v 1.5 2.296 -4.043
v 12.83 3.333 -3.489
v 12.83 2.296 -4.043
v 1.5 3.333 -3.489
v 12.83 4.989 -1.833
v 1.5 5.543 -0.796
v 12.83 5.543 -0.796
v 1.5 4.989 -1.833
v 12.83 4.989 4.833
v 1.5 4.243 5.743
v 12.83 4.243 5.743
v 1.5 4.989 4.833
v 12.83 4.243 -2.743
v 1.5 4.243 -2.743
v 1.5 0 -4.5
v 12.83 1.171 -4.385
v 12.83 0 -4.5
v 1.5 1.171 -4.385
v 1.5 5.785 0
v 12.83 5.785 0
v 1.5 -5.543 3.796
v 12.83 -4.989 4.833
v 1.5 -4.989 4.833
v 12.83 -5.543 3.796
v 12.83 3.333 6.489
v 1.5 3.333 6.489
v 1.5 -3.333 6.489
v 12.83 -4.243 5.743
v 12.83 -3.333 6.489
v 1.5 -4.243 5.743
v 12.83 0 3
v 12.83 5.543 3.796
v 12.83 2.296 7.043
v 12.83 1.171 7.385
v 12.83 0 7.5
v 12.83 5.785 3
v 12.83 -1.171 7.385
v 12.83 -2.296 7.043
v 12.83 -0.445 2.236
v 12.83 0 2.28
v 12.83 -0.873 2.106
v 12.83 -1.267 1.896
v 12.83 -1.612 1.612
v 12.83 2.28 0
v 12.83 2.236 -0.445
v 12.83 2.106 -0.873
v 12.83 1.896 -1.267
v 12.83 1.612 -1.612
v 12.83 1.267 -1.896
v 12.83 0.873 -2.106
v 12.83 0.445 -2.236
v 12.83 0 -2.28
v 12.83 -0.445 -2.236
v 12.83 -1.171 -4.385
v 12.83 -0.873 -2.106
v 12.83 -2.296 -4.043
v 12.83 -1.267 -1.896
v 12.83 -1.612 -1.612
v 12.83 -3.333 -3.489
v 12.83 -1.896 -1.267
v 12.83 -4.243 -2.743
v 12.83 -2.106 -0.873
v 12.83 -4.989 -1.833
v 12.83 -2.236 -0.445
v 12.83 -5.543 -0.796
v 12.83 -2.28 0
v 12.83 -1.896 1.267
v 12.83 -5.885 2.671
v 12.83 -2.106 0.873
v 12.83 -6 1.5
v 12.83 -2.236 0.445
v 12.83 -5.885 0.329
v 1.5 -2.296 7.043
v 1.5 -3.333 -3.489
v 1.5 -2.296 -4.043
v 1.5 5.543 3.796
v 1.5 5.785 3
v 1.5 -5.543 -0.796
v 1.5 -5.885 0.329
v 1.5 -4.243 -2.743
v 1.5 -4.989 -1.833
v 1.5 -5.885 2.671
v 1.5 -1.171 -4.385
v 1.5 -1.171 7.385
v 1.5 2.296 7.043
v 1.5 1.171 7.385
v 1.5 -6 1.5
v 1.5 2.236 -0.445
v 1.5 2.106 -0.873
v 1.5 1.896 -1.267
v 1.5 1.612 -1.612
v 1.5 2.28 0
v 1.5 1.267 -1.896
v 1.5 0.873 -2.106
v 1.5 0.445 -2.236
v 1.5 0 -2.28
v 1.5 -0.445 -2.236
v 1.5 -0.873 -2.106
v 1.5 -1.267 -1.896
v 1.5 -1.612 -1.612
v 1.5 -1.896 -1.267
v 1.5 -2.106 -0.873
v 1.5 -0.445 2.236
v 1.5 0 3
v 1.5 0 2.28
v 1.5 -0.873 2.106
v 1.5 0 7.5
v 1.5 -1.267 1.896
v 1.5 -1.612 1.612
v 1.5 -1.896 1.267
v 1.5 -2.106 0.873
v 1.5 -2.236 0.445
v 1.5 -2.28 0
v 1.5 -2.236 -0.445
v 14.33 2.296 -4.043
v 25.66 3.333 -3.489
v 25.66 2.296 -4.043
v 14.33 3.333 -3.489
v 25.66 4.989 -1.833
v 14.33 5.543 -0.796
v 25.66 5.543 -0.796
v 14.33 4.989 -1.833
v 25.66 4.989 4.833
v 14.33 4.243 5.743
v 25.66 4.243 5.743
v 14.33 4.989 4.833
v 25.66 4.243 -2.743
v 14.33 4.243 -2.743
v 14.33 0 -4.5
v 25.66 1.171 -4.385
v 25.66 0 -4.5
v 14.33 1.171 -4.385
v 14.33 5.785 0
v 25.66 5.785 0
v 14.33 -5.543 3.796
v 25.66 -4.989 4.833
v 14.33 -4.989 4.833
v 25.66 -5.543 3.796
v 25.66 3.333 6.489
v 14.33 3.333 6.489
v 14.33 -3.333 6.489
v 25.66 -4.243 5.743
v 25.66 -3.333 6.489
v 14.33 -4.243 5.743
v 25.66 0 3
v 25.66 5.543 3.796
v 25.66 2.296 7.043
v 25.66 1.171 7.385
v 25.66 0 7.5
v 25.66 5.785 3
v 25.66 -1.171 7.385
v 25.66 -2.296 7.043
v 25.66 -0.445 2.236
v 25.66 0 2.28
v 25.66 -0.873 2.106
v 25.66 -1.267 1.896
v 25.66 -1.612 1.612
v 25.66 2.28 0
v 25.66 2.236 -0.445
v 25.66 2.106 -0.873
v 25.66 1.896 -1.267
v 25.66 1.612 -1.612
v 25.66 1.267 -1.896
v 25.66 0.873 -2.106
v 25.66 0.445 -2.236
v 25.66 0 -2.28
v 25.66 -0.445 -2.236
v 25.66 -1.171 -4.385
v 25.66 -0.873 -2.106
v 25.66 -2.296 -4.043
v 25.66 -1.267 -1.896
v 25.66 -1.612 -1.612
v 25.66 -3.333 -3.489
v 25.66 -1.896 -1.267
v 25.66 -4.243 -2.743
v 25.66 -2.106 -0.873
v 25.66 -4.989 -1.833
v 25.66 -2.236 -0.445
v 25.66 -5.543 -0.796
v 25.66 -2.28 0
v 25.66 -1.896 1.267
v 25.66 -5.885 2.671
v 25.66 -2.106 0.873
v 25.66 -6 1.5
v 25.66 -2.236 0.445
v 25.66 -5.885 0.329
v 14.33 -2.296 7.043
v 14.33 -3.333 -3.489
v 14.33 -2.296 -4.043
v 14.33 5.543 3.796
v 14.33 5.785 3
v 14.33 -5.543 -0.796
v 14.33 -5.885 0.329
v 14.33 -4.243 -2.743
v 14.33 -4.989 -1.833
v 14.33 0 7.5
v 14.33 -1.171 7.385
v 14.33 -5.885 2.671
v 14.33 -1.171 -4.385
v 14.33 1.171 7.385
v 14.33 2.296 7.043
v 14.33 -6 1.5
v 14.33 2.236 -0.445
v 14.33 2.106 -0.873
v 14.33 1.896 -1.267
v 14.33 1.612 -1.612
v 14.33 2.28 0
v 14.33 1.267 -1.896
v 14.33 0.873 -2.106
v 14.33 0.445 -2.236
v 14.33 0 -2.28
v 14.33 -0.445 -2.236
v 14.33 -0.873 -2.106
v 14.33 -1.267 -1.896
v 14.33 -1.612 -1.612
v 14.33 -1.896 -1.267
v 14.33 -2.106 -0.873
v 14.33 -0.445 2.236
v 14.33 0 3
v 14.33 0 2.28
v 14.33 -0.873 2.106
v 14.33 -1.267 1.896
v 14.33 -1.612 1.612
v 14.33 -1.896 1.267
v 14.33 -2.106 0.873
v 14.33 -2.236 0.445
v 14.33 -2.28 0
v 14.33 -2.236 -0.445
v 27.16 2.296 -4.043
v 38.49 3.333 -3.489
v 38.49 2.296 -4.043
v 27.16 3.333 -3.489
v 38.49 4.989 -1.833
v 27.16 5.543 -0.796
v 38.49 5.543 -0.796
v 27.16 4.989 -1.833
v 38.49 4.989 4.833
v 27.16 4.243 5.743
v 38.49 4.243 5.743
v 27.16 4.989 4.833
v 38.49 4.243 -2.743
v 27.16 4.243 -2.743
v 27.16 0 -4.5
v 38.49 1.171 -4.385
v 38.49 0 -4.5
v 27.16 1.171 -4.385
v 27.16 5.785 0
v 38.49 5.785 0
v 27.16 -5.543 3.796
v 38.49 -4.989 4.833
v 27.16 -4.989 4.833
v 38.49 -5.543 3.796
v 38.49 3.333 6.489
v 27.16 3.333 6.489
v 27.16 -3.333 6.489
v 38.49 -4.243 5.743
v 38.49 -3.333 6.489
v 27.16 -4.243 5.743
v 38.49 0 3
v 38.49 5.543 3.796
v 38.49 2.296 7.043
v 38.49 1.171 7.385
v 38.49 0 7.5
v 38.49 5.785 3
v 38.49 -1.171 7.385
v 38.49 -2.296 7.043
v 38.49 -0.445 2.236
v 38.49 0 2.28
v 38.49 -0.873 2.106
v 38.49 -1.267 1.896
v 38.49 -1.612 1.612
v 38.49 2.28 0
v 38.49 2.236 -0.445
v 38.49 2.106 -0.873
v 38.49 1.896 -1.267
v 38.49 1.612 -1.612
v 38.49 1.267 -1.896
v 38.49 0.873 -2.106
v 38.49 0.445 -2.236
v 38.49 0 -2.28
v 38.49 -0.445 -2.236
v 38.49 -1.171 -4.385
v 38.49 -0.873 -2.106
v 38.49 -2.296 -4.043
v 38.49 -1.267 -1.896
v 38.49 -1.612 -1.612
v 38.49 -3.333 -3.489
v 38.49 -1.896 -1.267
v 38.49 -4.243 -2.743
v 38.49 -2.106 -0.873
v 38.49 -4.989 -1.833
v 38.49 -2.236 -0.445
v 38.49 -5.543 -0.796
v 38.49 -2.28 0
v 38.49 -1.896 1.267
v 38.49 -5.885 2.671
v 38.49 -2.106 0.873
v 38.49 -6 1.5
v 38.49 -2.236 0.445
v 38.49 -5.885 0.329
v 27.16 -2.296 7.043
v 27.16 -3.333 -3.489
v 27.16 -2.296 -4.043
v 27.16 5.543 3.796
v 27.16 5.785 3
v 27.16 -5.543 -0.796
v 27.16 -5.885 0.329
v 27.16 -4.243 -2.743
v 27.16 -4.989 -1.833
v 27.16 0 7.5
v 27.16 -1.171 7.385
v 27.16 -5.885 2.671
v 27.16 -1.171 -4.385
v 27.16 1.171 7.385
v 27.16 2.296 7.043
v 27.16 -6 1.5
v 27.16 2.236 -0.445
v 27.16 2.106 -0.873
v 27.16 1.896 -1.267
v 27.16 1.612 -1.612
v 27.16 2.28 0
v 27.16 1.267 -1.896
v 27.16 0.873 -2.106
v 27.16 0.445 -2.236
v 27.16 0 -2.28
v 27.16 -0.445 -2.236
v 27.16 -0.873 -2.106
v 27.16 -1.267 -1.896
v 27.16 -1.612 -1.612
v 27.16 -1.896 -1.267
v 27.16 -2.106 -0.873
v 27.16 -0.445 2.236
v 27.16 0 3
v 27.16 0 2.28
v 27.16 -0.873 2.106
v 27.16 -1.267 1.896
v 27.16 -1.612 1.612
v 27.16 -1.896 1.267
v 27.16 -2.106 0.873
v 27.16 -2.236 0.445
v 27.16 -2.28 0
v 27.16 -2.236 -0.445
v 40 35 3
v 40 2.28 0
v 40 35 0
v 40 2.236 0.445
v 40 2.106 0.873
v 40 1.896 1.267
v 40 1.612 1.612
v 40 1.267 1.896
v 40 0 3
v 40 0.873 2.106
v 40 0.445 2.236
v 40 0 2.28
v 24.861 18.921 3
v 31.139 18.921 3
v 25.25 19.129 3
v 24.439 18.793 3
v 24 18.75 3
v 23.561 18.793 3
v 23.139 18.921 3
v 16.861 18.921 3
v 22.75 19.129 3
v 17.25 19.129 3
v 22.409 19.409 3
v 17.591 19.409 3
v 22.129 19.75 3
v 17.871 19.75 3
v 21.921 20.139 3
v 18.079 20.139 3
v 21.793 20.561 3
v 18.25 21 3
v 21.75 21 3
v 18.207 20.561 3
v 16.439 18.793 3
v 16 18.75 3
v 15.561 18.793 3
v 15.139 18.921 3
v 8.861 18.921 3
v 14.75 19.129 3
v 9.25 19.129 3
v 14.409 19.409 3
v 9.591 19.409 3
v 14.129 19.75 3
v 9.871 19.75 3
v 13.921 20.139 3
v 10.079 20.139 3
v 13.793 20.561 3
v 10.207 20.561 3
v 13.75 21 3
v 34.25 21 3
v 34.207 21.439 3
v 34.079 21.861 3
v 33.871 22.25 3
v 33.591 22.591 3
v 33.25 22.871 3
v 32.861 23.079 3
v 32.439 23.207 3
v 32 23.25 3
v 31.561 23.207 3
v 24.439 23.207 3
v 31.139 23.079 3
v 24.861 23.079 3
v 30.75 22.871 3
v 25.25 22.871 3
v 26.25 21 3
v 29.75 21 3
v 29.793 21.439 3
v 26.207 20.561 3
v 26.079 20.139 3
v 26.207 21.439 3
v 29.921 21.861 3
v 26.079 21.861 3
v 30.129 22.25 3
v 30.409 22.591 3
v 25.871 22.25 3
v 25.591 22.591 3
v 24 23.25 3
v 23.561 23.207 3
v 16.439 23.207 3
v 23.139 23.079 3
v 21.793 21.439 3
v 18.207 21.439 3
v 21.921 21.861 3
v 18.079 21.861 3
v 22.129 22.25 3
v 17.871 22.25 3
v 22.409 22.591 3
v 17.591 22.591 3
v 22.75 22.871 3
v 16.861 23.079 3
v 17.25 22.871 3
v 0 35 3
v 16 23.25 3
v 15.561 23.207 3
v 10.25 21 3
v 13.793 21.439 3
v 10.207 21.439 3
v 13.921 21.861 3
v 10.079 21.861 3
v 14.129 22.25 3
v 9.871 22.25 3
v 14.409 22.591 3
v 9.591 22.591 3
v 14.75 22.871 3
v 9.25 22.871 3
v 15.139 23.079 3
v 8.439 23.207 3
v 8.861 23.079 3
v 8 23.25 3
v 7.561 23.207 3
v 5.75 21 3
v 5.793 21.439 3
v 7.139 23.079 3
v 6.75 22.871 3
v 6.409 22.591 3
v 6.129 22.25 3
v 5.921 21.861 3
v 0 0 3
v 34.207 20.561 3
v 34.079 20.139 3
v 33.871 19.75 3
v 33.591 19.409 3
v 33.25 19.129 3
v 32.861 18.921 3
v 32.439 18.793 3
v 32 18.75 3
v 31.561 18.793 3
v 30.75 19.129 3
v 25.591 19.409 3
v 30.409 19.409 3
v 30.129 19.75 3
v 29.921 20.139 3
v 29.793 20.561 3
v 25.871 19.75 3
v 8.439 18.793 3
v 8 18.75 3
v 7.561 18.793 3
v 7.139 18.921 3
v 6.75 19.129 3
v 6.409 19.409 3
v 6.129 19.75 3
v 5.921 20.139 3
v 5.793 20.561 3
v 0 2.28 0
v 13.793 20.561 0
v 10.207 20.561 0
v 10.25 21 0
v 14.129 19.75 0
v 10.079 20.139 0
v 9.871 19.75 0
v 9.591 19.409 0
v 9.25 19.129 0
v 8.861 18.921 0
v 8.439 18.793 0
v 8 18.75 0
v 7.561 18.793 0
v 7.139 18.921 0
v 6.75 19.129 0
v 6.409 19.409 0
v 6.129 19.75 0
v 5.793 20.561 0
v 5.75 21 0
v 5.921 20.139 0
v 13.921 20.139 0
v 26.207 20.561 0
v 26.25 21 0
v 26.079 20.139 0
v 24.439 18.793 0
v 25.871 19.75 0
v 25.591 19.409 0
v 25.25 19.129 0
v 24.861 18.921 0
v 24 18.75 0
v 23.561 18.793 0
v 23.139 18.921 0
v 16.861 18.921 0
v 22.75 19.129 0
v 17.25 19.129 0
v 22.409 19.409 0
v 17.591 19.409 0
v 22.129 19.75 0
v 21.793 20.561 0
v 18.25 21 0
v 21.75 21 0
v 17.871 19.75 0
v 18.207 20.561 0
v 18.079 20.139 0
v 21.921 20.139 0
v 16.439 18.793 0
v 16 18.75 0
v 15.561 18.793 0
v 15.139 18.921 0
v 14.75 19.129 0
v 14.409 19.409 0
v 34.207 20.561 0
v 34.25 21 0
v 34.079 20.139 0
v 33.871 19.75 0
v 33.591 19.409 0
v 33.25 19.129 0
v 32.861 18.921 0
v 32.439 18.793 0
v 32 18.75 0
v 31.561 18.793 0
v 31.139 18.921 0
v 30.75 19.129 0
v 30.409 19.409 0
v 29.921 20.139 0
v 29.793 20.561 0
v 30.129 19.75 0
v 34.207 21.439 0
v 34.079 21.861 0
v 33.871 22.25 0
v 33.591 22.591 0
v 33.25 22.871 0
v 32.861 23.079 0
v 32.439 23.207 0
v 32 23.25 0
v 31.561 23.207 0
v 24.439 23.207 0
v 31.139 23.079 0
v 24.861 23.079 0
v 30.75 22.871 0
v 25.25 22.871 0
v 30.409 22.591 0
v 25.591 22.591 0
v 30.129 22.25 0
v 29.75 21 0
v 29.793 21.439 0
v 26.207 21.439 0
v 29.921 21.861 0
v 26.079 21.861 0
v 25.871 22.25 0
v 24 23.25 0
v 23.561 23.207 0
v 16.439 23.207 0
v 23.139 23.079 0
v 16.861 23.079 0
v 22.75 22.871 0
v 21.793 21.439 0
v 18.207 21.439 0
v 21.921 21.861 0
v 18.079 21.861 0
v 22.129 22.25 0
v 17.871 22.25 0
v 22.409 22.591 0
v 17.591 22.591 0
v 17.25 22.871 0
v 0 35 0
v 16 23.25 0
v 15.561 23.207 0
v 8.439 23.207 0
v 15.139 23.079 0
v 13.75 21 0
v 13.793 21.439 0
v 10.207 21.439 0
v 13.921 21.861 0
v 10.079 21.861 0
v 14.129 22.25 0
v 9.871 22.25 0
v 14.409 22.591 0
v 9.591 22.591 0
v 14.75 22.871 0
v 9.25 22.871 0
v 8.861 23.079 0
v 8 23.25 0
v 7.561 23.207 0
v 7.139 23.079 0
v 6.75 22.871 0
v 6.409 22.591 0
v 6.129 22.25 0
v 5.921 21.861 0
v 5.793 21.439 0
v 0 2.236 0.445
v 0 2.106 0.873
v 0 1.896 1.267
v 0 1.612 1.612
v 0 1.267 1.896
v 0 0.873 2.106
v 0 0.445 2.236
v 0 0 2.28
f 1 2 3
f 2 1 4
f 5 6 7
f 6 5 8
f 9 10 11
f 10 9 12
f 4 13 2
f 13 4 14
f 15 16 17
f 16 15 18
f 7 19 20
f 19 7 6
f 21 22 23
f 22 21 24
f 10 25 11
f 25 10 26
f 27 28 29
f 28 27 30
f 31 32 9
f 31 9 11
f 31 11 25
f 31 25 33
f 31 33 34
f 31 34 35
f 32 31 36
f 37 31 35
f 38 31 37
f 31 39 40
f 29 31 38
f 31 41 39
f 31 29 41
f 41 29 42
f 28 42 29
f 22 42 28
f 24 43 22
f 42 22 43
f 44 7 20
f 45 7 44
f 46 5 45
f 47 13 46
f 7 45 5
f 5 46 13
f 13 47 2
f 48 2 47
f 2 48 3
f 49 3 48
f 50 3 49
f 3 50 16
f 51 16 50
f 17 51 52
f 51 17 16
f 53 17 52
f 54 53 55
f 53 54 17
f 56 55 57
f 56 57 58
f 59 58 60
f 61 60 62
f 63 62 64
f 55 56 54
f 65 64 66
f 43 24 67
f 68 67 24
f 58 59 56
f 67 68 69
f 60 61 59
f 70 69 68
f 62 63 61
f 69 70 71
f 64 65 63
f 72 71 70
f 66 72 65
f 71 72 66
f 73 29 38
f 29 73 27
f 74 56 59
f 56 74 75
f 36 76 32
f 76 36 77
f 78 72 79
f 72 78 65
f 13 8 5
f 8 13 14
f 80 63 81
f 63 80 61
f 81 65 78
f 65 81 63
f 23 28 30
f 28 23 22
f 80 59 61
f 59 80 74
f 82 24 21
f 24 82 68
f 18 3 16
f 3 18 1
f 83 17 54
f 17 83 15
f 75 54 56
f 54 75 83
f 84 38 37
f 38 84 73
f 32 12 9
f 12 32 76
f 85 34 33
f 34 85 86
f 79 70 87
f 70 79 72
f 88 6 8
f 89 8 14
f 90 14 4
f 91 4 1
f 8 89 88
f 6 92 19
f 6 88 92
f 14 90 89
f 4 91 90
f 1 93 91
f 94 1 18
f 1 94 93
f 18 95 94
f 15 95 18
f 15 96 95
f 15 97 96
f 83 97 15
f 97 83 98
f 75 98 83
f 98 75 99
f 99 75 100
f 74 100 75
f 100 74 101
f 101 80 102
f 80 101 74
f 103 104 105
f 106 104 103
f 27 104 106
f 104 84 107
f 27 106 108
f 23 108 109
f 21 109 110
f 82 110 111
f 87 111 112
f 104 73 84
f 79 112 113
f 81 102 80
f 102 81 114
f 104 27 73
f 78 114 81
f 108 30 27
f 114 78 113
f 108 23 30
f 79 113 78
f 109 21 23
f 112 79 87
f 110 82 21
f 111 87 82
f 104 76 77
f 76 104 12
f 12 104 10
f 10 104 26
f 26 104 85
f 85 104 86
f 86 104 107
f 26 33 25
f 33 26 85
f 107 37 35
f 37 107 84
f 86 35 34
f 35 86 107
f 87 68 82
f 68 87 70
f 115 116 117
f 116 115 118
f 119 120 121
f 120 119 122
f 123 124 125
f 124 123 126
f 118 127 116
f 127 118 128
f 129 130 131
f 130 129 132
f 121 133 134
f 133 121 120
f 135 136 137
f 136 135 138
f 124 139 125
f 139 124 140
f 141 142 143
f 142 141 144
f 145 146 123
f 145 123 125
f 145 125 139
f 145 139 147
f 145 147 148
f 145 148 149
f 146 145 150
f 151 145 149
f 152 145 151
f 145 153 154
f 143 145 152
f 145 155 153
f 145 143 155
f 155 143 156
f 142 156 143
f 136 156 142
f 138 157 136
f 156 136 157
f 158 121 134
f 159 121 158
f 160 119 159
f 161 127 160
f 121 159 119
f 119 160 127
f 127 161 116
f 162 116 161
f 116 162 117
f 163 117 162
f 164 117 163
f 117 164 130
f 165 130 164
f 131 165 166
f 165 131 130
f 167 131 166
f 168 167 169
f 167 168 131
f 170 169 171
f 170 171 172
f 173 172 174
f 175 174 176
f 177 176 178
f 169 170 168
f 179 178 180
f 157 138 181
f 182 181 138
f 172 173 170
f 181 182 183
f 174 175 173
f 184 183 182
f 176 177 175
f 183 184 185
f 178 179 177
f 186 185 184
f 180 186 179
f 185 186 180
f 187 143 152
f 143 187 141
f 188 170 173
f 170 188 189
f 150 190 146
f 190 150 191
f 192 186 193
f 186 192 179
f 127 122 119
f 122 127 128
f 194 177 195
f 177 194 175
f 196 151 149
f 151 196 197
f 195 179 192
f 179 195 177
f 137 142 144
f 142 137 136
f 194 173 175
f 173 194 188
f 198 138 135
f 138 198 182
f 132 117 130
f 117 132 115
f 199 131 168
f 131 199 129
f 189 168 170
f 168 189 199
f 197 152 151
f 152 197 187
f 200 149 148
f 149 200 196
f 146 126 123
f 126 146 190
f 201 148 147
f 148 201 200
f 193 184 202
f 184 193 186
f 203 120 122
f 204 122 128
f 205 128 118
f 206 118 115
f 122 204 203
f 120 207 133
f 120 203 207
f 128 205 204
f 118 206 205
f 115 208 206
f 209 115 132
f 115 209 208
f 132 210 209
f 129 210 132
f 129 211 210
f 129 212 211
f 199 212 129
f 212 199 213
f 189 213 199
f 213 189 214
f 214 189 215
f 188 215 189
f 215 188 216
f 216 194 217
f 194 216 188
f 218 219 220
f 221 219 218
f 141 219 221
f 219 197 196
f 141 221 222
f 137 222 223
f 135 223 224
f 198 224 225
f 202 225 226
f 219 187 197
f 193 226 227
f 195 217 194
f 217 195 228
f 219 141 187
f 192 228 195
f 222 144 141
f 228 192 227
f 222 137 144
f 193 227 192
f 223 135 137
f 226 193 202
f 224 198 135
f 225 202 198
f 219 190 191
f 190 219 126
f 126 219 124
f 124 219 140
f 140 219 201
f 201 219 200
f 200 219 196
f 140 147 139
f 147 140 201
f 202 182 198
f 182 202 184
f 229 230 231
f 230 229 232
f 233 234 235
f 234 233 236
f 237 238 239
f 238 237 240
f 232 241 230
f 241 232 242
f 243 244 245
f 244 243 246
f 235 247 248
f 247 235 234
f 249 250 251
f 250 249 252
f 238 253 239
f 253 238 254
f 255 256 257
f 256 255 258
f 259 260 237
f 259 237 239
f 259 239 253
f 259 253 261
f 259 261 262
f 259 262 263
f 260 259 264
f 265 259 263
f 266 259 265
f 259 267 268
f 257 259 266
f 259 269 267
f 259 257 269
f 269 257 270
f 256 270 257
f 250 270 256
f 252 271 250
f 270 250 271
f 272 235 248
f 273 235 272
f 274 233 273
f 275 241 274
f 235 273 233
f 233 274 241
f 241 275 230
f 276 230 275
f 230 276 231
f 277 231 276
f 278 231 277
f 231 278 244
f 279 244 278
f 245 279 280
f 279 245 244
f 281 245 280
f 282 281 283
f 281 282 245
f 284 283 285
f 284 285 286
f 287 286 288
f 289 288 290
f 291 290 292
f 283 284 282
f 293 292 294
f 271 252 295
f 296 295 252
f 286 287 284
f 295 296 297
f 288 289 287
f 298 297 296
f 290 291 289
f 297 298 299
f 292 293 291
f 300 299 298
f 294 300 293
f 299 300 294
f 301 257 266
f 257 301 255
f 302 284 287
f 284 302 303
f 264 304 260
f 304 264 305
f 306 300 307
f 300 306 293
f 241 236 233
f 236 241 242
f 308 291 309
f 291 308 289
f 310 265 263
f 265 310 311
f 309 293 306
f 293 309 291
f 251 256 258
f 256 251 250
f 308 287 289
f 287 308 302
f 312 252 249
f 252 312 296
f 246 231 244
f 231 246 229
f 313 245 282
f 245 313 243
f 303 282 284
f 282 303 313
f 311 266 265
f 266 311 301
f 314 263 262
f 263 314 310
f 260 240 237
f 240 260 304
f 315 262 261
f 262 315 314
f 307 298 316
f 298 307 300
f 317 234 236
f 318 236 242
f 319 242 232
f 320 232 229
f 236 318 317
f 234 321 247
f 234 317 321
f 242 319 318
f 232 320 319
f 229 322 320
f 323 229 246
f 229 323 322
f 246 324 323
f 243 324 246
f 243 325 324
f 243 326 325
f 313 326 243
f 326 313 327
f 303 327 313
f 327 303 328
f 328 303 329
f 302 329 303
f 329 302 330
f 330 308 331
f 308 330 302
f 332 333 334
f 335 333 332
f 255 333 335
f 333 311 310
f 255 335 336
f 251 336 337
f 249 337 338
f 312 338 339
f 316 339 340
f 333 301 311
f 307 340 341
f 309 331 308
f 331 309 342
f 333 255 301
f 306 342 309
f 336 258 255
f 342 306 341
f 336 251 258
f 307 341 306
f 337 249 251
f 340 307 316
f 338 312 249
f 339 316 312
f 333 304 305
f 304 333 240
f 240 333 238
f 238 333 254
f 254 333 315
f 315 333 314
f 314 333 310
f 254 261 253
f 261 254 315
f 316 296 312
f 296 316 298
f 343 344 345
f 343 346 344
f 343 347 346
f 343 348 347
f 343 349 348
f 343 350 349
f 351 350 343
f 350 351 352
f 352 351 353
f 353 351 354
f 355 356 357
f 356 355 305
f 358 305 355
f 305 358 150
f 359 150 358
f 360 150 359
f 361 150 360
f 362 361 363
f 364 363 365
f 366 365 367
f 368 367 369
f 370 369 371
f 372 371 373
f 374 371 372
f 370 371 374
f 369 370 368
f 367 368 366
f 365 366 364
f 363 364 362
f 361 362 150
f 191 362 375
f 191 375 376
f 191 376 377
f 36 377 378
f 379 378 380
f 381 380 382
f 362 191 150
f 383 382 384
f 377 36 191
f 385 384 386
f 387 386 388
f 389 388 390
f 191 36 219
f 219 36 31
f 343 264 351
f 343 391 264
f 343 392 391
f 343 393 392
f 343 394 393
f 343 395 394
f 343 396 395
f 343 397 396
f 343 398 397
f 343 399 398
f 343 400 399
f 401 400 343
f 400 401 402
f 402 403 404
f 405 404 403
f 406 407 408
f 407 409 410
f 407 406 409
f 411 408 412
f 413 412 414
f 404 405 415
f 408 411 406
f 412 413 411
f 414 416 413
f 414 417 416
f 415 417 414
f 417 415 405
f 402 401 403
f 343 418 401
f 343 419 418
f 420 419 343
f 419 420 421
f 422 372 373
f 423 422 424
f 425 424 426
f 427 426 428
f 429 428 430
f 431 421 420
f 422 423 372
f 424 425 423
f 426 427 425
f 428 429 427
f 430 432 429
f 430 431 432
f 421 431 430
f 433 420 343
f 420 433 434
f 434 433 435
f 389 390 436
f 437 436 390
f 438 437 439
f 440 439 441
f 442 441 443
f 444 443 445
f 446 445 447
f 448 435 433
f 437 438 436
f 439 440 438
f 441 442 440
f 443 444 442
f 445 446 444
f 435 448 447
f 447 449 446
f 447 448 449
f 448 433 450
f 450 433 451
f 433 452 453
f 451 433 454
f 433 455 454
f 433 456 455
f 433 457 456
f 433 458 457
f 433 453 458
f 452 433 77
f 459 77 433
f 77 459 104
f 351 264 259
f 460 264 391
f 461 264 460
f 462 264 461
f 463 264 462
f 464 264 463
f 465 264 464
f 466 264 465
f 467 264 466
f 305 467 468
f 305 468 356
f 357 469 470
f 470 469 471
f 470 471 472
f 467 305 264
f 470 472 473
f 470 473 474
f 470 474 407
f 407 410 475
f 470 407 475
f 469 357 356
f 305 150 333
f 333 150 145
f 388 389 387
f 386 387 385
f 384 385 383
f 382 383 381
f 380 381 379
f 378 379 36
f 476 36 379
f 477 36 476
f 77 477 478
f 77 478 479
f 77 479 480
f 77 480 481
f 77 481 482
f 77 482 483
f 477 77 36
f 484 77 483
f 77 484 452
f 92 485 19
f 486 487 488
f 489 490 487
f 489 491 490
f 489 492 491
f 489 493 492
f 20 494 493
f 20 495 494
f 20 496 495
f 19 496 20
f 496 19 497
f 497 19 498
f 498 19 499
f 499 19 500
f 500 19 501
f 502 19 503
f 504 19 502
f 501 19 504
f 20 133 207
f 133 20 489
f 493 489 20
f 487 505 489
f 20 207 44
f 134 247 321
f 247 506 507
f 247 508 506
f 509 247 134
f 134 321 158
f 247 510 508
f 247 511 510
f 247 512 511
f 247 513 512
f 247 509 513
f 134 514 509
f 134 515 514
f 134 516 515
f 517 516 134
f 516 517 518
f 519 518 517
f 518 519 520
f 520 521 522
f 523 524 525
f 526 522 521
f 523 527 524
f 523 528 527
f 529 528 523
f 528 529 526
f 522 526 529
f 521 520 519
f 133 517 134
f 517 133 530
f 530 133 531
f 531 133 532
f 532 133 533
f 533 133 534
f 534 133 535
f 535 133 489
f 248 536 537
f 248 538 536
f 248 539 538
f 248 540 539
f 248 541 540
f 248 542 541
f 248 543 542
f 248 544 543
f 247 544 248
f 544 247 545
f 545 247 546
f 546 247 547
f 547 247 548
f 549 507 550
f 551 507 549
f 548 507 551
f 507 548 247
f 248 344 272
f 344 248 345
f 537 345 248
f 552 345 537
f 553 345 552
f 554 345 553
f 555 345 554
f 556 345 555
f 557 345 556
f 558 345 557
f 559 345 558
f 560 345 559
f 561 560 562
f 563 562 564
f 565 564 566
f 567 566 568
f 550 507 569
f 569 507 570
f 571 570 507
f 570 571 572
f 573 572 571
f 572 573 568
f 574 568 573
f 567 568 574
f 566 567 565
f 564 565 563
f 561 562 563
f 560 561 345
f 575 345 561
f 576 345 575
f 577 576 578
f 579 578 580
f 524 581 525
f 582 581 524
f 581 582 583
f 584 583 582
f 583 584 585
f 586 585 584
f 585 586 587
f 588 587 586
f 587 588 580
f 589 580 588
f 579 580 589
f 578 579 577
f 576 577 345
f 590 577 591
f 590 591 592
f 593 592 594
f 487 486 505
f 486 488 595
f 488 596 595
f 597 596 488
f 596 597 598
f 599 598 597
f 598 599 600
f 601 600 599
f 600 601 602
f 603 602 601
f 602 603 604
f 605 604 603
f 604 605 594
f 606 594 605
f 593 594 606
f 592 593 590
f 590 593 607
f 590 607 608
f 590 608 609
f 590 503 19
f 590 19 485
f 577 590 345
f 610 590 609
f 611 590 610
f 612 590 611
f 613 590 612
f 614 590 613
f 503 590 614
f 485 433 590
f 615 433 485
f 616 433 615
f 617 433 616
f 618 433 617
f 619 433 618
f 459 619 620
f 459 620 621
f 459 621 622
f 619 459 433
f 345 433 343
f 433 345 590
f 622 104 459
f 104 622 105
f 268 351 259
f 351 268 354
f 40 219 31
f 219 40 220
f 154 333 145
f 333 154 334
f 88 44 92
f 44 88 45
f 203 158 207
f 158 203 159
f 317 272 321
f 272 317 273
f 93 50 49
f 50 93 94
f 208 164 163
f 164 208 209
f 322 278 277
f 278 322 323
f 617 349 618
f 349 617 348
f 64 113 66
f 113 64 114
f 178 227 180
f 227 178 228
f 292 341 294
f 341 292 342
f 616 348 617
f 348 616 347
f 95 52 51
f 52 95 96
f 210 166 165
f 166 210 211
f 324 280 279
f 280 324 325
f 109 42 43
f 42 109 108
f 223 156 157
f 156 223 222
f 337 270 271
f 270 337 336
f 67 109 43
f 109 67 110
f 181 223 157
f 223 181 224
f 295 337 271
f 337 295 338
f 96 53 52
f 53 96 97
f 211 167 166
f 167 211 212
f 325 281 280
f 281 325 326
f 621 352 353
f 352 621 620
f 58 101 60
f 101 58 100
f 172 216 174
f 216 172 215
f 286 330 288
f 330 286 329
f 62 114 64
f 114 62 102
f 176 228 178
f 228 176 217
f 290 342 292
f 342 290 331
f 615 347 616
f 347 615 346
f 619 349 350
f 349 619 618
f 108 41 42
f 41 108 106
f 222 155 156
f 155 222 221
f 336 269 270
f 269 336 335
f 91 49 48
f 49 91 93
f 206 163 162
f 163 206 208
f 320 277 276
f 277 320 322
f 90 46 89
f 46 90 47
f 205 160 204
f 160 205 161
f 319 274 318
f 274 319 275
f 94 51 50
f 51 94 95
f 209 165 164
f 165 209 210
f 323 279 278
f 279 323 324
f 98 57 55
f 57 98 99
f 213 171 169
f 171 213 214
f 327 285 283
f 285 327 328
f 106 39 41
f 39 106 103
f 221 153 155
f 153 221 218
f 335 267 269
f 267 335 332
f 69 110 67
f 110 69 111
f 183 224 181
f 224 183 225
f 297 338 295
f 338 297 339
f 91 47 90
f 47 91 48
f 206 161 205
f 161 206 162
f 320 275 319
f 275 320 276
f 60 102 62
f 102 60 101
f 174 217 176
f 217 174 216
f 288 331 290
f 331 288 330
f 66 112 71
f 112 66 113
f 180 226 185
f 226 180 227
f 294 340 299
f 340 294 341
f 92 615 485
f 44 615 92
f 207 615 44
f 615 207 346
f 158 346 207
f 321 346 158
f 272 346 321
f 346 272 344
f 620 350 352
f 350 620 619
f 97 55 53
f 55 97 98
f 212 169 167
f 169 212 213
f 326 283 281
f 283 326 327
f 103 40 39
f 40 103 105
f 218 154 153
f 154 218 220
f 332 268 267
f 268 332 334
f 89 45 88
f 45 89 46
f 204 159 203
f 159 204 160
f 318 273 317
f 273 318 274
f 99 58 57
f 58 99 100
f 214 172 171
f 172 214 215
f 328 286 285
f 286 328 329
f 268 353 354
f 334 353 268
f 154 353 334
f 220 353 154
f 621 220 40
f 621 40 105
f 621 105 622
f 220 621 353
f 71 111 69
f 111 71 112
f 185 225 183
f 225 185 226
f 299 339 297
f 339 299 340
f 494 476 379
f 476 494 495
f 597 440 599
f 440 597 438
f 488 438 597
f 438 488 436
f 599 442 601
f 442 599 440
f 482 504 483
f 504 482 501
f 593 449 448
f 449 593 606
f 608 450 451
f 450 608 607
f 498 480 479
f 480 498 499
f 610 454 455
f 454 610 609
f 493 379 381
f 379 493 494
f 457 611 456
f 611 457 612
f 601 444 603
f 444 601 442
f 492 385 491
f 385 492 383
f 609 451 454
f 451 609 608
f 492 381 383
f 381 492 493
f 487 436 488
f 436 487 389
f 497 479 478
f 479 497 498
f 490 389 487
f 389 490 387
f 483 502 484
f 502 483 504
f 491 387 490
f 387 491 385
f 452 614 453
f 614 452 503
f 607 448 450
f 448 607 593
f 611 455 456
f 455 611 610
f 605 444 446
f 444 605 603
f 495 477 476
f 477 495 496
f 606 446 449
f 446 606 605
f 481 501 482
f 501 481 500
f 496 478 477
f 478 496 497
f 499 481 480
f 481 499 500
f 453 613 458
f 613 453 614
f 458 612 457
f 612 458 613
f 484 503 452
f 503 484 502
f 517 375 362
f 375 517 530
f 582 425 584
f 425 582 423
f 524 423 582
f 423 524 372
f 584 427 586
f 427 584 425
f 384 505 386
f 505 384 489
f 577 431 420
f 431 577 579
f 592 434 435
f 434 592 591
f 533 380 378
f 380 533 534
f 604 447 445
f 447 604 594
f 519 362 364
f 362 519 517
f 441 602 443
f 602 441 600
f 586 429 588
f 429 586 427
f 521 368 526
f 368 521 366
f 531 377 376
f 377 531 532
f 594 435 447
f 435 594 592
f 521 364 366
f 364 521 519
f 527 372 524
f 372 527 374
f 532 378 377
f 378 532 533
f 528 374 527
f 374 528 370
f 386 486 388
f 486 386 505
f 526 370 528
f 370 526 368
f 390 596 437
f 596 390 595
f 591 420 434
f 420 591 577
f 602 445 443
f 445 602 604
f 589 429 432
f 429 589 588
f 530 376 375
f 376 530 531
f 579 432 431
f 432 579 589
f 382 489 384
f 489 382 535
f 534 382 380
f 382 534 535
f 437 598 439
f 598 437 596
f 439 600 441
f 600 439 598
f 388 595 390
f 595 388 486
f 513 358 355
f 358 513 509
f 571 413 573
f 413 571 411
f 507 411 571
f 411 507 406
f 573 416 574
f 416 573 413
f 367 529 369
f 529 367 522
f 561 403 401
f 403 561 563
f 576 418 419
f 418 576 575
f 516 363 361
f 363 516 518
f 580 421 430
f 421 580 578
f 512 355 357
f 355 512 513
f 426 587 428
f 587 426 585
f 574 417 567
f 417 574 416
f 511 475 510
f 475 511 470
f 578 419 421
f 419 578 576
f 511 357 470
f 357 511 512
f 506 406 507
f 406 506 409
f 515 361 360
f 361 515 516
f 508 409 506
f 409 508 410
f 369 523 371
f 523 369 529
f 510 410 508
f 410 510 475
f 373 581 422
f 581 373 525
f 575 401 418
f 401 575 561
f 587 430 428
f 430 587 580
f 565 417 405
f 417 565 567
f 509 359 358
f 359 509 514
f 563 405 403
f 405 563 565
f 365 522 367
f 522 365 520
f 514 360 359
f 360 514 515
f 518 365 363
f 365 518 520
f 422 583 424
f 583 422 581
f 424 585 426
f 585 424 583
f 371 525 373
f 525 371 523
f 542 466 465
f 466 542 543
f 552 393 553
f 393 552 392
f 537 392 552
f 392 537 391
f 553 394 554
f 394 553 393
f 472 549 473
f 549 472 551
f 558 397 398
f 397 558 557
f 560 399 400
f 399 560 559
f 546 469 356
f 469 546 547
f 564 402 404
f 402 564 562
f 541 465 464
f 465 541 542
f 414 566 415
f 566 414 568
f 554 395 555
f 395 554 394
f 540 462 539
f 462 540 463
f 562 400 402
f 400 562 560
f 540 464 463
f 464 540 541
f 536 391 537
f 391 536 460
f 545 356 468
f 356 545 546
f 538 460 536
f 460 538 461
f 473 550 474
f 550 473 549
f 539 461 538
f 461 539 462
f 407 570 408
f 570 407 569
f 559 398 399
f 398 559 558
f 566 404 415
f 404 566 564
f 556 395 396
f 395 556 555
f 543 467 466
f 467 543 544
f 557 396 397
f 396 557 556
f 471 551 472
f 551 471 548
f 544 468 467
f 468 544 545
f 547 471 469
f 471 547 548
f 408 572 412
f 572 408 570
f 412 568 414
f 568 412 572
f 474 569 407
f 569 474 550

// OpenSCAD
$fn = 32;

// ----------------------------------------------------------------------
// Hinge leaf: 40 x 41 x 12 mm
// ----------------------------------------------------------------------

// --- parameters (mm) ---
leaf_len = 40;            // leaf length, X
leaf_w = 35;              // leaf width, Y
leaf_t = 3;               // leaf thickness
knuckle_d = 12;           // knuckle diameter
knuckle_w = 11.33;        // knuckle width
knuckle_n = 3;            // number of knuckles
pin_d = 4.56;             // pin bore
gap = 1.5;                // gap between the knuckles
screw_d = 4.5;            // screw clearance

module leaf() {
  cube([leaf_len, leaf_w, leaf_t]);
}

module knuckles() {
  /* barrels sit on the leaf edge, the pin axis at half the leaf thickness */
  for (i = [0 : knuckle_n - 1])
    translate([gap + i * (knuckle_w + gap), 0, leaf_t * 0.5])
      rotate([0, 90, 0]) cylinder(h = knuckle_w, d = knuckle_d);
}

difference() {
  union() {
    leaf();
    knuckles();
  }
  rotate([0, 90, 0]) translate([0, 0, -1])
    cylinder(h = leaf_len + 2, d = pin_d);
  translate([8, leaf_w * 0.6, -1]) cylinder(h = leaf_t + 2, d = screw_d);
  translate([16, leaf_w * 0.6, -1]) cylinder(h = leaf_t + 2, d = screw_d);
  translate([24, leaf_w * 0.6, -1]) cylinder(h = leaf_t + 2, d = screw_d);
  translate([32, leaf_w * 0.6, -1]) cylinder(h = leaf_t + 2, d = screw_d);
}
